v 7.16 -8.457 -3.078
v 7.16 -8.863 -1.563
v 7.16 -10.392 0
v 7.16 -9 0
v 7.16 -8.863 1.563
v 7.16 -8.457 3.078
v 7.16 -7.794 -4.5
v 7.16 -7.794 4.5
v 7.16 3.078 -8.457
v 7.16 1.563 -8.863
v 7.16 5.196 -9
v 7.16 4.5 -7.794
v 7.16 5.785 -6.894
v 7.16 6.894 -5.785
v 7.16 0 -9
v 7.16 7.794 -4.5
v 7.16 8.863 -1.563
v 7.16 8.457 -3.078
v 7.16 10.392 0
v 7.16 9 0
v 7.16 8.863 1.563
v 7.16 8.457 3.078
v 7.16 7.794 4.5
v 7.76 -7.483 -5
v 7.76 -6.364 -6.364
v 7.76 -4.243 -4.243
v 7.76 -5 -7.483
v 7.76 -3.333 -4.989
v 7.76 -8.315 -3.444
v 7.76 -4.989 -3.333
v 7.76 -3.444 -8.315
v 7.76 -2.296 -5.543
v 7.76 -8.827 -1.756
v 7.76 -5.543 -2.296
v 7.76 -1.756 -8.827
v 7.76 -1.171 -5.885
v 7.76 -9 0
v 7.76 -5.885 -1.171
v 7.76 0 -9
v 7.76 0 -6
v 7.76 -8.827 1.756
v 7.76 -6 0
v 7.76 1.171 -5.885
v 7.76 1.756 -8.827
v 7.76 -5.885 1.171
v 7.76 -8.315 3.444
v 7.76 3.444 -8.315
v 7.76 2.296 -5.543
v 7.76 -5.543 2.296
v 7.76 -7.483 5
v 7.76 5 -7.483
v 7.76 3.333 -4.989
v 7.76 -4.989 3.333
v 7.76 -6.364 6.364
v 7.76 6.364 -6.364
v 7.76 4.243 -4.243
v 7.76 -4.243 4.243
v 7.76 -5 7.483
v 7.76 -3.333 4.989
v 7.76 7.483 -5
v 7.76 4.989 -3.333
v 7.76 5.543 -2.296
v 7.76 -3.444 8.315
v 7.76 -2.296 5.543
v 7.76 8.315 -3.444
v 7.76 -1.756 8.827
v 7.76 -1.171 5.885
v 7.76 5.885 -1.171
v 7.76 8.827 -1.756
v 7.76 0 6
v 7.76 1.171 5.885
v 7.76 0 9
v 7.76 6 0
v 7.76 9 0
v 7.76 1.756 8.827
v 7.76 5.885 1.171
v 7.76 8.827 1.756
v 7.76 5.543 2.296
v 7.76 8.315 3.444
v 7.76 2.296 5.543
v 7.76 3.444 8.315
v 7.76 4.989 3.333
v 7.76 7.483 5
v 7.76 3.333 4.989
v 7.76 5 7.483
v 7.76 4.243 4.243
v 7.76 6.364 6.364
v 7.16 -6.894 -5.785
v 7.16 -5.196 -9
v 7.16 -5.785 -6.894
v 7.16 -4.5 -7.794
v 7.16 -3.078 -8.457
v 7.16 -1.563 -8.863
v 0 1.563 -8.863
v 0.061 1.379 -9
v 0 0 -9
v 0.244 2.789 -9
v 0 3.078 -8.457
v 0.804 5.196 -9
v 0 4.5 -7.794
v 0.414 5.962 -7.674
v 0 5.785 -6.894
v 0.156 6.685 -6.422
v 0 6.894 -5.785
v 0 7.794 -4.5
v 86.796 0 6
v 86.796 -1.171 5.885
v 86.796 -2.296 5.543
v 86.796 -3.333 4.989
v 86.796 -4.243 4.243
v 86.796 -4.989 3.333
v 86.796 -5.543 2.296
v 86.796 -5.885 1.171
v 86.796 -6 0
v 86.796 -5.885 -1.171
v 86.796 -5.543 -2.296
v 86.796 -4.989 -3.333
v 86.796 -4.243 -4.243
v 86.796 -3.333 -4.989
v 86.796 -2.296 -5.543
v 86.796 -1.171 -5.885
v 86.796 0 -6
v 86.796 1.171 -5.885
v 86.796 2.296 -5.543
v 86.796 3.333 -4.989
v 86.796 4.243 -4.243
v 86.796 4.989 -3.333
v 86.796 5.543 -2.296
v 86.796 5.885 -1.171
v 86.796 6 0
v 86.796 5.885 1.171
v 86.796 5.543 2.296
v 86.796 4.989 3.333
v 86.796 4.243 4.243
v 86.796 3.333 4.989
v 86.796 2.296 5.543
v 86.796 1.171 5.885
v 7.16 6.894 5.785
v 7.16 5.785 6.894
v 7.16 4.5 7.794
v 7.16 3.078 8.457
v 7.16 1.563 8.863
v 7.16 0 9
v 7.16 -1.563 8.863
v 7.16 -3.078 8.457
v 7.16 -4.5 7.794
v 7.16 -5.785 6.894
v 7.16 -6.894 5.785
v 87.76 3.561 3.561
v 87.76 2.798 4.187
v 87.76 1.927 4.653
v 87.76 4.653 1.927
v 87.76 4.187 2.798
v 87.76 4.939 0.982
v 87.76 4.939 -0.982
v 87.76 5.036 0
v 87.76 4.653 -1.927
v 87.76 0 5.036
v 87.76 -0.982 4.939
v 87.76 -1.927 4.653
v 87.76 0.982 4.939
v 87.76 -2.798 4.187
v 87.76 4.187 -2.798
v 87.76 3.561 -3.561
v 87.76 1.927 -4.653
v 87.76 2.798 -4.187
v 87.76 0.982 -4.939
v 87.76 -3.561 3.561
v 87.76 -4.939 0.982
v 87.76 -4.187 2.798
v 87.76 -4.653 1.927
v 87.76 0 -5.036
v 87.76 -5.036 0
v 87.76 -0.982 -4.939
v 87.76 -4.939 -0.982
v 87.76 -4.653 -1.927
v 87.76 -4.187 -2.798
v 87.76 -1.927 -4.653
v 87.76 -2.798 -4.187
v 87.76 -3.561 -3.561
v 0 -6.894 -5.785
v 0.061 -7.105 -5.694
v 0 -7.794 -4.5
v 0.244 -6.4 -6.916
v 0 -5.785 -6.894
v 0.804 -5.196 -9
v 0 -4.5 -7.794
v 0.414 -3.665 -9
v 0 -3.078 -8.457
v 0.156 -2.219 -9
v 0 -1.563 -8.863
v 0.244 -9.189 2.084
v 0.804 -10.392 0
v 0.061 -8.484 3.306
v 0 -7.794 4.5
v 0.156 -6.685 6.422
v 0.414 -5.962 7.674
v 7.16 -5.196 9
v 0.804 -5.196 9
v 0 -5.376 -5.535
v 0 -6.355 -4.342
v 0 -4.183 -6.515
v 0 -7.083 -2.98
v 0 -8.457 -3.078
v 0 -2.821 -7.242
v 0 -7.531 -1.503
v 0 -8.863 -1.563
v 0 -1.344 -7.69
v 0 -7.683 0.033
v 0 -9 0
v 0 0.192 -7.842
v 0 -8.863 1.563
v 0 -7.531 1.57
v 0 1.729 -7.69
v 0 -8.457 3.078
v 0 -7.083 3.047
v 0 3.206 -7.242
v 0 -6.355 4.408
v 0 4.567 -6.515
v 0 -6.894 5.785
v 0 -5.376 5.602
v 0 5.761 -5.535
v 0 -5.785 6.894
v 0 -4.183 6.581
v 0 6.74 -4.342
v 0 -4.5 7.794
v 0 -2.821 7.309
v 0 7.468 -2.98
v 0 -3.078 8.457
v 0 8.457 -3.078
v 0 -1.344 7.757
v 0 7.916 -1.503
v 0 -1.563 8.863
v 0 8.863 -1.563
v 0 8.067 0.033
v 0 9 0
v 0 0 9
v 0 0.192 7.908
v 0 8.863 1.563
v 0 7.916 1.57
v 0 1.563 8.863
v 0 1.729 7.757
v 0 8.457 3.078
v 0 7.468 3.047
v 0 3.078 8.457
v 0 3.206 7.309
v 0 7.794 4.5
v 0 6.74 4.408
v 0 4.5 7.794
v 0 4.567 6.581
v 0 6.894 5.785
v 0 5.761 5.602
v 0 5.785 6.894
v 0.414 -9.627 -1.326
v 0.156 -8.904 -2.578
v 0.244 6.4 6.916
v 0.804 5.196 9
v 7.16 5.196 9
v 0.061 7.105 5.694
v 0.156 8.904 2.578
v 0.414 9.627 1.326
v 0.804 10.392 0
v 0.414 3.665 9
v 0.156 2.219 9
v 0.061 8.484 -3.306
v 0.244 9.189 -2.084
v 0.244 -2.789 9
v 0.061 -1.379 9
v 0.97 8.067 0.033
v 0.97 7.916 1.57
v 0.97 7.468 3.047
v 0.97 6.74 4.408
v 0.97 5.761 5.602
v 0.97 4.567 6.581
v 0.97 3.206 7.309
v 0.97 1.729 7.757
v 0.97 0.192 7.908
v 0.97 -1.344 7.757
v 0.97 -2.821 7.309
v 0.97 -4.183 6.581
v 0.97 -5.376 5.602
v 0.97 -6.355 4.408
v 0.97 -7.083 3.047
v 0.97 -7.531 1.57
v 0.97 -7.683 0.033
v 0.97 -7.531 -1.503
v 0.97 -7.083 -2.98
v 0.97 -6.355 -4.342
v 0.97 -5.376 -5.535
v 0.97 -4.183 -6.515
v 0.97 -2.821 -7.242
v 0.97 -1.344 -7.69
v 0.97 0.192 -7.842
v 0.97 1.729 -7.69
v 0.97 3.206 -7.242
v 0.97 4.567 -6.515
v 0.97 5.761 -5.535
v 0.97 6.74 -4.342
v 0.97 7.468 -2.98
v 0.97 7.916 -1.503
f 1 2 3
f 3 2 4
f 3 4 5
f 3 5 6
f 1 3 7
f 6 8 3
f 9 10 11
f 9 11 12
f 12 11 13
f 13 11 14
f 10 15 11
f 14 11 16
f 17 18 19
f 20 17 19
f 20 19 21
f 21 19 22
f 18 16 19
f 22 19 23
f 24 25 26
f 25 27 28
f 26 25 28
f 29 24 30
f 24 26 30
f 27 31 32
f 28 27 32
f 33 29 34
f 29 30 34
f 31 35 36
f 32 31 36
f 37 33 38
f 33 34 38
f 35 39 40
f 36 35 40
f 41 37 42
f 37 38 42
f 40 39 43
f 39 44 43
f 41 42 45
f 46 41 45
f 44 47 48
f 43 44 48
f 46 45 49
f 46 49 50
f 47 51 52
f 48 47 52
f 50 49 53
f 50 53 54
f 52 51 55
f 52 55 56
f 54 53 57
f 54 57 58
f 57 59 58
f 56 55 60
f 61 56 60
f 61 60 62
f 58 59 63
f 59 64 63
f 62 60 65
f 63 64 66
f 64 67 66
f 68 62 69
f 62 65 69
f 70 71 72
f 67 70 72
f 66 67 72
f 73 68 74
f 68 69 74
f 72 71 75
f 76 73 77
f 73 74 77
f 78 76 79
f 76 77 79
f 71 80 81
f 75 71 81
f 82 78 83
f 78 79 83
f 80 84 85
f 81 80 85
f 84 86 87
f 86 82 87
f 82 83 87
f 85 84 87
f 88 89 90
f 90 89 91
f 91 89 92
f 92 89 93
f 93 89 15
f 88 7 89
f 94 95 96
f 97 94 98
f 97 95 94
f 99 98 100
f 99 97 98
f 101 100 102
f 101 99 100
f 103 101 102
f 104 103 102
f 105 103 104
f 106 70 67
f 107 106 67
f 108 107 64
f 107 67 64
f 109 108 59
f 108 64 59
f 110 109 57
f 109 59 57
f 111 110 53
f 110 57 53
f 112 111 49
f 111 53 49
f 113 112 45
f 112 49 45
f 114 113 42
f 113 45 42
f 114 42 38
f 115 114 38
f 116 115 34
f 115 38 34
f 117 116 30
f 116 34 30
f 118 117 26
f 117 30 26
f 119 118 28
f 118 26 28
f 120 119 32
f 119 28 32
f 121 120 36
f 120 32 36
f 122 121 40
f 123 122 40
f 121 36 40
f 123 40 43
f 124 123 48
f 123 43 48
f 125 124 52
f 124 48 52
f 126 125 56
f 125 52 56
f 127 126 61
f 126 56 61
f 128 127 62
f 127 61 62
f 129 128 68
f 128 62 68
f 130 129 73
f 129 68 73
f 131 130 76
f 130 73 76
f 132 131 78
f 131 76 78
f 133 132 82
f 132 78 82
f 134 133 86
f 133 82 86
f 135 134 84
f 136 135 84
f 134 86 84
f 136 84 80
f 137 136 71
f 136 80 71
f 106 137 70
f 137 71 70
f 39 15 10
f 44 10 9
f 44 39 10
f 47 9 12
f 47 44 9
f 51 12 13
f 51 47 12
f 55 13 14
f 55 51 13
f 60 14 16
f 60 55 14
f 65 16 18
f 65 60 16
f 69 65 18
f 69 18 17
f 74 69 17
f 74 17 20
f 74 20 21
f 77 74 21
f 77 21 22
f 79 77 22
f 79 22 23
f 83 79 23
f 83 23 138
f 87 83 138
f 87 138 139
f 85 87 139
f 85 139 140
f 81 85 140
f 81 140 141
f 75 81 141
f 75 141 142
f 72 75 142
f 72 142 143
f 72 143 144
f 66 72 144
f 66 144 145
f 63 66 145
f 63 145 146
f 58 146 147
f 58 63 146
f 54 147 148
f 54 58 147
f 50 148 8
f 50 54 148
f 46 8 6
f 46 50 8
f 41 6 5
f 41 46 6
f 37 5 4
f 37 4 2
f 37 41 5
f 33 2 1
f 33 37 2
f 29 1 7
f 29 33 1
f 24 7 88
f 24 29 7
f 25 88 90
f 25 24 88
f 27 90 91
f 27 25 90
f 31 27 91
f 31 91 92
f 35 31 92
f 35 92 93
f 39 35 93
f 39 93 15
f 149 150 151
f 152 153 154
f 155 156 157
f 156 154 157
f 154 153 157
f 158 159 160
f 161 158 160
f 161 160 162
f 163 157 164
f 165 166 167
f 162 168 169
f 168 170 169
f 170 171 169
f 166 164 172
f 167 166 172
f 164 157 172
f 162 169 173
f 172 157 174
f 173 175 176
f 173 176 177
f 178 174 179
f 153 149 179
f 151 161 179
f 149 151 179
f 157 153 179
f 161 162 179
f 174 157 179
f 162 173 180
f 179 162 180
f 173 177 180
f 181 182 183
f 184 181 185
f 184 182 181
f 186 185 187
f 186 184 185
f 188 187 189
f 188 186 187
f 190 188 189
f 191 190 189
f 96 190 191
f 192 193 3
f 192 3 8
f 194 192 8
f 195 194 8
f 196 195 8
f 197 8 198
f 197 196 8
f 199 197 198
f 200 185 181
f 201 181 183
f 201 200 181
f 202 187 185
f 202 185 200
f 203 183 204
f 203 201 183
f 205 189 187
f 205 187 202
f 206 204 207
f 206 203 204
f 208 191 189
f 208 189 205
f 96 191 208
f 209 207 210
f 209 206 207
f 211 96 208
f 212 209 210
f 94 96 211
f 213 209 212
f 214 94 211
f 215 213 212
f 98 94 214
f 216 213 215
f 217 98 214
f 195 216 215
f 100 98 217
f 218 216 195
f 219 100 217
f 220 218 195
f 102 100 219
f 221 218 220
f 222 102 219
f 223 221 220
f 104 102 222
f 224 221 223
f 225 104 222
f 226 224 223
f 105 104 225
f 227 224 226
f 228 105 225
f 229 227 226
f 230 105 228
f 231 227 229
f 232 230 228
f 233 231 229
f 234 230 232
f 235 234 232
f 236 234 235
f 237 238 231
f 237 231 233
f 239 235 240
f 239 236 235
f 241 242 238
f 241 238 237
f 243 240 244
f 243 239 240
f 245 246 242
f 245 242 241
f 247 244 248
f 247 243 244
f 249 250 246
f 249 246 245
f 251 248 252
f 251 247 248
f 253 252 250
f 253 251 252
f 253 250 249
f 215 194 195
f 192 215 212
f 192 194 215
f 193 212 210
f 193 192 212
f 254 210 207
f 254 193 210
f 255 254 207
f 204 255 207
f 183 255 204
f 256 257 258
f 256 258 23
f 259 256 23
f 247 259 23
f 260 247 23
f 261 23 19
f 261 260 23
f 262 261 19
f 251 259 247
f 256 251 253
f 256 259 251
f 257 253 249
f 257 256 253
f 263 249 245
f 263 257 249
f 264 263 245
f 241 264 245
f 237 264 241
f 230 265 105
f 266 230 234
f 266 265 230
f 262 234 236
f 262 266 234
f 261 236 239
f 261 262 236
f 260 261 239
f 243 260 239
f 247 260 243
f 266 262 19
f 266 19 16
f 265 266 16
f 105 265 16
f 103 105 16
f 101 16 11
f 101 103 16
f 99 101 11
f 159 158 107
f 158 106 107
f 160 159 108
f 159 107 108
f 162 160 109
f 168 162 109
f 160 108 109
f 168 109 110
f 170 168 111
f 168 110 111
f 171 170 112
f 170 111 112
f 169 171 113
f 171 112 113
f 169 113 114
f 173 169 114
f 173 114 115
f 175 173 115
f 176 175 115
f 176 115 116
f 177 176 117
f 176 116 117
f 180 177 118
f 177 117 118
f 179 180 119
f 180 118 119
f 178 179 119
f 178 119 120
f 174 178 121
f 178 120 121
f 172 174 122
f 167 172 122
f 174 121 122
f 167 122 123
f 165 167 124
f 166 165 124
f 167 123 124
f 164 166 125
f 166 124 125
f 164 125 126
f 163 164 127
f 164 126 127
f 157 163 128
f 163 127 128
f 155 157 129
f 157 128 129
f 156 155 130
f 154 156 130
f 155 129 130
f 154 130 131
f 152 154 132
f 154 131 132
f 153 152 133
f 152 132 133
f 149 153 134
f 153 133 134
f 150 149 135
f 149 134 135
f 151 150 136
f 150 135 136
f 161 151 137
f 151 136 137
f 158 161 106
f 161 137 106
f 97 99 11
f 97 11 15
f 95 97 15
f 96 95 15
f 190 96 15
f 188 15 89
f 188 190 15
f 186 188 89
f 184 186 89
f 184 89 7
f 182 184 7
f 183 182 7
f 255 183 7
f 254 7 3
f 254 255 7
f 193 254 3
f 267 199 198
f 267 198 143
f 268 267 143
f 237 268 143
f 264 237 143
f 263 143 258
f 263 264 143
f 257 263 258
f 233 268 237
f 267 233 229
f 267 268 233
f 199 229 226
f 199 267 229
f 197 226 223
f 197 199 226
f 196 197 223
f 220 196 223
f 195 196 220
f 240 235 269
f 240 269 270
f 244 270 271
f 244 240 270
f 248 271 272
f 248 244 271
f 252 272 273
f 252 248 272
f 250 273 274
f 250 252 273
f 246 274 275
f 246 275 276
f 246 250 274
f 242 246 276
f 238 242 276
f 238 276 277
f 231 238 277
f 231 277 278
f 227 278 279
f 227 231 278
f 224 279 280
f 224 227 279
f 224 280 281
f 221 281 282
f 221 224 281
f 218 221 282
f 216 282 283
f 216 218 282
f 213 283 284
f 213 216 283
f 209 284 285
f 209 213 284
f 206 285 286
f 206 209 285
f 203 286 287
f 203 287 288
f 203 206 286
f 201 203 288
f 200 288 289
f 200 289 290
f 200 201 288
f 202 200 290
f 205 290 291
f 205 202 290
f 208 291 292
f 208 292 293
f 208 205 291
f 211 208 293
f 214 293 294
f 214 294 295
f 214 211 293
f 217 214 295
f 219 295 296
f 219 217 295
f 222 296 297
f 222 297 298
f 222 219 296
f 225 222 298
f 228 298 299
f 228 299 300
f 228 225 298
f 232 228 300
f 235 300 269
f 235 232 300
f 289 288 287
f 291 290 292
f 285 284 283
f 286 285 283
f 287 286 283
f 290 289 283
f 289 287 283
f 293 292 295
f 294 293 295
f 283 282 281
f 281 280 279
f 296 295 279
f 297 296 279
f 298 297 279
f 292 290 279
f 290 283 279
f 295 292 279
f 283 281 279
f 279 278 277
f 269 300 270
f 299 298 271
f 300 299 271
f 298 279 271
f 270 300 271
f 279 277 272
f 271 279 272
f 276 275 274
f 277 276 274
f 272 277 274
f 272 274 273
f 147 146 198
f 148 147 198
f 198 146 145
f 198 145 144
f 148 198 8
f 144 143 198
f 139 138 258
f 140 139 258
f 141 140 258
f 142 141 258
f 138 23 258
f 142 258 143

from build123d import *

# Parameters (mm, degrees)
BASEHEAD_DEPTH   = 7.76
INDENT_OUTLINE_R = 7.875
INDENT_DEPTH     = 0.97
SKETCH4_W        = 0.6
SKETCH4_H        = 11.392304845


# Read off the part's stored shape, not the designer's step: Indent
with BuildPart() as part:
    # Sketch1 → BaseHead (new body)
    with BuildSketch(Plane(origin=(0, 0, 0), x_dir=(0, 0, -1), z_dir=(1, 0, 0))):
        Polygon((9, 5.196152423), (9, -5.196152423), (0, -10.392304845), (-9, -5.196152423), (-9, 5.196152423), (0, 10.392304845), align=None)
    extrude(amount=BASEHEAD_DEPTH)

    # BodySke → BaseBody (revolve)
    with BuildSketch(Plane.XY, mode=Mode.PRIVATE) as basebody_sk:
        Polygon((0, 0), (87.76, 0), (87.76, 5.036), (86.796, 6), (0, 6), align=None)
    revolve(basebody_sk.sketch.rotate(Axis((0, 0, 0), (1, 0, 0)), 90), axis=Axis((0, 0, 0), (1, 0, 0)))

    # Indent outline → Indent (cut)
    with BuildSketch(Plane.YZ):
        with Locations((0.192376607, 0.033212245)):
            Circle(INDENT_OUTLINE_R)
    extrude(amount=INDENT_DEPTH, mode=Mode.SUBTRACT)

    # Sketch3 → HeadChamfer (revolve, cut)
    with BuildSketch(Plane.XY):
        Polygon((0, 9), (3.690598923, 15.392304845), (3.690598923, 20.392304845), (-10, 20.392304845), (-10, 9), align=None)
    revolve(axis=Axis((0, 0, 0), (1, 0, 0)), mode=Mode.SUBTRACT)

    # Sketch4 → BearingFace (revolve, cut)
    with BuildSketch(Plane.XY, mode=Mode.PRIVATE) as bearingface_sk:
        with Locations((7.46, 14.696152423)):
            Rectangle(SKETCH4_W, SKETCH4_H)
    revolve(bearingface_sk.sketch.rotate(Axis((0, 0, 0), (1, 0, 0)), 270), axis=Axis((0, 0, 0), (1, 0, 0)), mode=Mode.SUBTRACT)


solid = part.part
